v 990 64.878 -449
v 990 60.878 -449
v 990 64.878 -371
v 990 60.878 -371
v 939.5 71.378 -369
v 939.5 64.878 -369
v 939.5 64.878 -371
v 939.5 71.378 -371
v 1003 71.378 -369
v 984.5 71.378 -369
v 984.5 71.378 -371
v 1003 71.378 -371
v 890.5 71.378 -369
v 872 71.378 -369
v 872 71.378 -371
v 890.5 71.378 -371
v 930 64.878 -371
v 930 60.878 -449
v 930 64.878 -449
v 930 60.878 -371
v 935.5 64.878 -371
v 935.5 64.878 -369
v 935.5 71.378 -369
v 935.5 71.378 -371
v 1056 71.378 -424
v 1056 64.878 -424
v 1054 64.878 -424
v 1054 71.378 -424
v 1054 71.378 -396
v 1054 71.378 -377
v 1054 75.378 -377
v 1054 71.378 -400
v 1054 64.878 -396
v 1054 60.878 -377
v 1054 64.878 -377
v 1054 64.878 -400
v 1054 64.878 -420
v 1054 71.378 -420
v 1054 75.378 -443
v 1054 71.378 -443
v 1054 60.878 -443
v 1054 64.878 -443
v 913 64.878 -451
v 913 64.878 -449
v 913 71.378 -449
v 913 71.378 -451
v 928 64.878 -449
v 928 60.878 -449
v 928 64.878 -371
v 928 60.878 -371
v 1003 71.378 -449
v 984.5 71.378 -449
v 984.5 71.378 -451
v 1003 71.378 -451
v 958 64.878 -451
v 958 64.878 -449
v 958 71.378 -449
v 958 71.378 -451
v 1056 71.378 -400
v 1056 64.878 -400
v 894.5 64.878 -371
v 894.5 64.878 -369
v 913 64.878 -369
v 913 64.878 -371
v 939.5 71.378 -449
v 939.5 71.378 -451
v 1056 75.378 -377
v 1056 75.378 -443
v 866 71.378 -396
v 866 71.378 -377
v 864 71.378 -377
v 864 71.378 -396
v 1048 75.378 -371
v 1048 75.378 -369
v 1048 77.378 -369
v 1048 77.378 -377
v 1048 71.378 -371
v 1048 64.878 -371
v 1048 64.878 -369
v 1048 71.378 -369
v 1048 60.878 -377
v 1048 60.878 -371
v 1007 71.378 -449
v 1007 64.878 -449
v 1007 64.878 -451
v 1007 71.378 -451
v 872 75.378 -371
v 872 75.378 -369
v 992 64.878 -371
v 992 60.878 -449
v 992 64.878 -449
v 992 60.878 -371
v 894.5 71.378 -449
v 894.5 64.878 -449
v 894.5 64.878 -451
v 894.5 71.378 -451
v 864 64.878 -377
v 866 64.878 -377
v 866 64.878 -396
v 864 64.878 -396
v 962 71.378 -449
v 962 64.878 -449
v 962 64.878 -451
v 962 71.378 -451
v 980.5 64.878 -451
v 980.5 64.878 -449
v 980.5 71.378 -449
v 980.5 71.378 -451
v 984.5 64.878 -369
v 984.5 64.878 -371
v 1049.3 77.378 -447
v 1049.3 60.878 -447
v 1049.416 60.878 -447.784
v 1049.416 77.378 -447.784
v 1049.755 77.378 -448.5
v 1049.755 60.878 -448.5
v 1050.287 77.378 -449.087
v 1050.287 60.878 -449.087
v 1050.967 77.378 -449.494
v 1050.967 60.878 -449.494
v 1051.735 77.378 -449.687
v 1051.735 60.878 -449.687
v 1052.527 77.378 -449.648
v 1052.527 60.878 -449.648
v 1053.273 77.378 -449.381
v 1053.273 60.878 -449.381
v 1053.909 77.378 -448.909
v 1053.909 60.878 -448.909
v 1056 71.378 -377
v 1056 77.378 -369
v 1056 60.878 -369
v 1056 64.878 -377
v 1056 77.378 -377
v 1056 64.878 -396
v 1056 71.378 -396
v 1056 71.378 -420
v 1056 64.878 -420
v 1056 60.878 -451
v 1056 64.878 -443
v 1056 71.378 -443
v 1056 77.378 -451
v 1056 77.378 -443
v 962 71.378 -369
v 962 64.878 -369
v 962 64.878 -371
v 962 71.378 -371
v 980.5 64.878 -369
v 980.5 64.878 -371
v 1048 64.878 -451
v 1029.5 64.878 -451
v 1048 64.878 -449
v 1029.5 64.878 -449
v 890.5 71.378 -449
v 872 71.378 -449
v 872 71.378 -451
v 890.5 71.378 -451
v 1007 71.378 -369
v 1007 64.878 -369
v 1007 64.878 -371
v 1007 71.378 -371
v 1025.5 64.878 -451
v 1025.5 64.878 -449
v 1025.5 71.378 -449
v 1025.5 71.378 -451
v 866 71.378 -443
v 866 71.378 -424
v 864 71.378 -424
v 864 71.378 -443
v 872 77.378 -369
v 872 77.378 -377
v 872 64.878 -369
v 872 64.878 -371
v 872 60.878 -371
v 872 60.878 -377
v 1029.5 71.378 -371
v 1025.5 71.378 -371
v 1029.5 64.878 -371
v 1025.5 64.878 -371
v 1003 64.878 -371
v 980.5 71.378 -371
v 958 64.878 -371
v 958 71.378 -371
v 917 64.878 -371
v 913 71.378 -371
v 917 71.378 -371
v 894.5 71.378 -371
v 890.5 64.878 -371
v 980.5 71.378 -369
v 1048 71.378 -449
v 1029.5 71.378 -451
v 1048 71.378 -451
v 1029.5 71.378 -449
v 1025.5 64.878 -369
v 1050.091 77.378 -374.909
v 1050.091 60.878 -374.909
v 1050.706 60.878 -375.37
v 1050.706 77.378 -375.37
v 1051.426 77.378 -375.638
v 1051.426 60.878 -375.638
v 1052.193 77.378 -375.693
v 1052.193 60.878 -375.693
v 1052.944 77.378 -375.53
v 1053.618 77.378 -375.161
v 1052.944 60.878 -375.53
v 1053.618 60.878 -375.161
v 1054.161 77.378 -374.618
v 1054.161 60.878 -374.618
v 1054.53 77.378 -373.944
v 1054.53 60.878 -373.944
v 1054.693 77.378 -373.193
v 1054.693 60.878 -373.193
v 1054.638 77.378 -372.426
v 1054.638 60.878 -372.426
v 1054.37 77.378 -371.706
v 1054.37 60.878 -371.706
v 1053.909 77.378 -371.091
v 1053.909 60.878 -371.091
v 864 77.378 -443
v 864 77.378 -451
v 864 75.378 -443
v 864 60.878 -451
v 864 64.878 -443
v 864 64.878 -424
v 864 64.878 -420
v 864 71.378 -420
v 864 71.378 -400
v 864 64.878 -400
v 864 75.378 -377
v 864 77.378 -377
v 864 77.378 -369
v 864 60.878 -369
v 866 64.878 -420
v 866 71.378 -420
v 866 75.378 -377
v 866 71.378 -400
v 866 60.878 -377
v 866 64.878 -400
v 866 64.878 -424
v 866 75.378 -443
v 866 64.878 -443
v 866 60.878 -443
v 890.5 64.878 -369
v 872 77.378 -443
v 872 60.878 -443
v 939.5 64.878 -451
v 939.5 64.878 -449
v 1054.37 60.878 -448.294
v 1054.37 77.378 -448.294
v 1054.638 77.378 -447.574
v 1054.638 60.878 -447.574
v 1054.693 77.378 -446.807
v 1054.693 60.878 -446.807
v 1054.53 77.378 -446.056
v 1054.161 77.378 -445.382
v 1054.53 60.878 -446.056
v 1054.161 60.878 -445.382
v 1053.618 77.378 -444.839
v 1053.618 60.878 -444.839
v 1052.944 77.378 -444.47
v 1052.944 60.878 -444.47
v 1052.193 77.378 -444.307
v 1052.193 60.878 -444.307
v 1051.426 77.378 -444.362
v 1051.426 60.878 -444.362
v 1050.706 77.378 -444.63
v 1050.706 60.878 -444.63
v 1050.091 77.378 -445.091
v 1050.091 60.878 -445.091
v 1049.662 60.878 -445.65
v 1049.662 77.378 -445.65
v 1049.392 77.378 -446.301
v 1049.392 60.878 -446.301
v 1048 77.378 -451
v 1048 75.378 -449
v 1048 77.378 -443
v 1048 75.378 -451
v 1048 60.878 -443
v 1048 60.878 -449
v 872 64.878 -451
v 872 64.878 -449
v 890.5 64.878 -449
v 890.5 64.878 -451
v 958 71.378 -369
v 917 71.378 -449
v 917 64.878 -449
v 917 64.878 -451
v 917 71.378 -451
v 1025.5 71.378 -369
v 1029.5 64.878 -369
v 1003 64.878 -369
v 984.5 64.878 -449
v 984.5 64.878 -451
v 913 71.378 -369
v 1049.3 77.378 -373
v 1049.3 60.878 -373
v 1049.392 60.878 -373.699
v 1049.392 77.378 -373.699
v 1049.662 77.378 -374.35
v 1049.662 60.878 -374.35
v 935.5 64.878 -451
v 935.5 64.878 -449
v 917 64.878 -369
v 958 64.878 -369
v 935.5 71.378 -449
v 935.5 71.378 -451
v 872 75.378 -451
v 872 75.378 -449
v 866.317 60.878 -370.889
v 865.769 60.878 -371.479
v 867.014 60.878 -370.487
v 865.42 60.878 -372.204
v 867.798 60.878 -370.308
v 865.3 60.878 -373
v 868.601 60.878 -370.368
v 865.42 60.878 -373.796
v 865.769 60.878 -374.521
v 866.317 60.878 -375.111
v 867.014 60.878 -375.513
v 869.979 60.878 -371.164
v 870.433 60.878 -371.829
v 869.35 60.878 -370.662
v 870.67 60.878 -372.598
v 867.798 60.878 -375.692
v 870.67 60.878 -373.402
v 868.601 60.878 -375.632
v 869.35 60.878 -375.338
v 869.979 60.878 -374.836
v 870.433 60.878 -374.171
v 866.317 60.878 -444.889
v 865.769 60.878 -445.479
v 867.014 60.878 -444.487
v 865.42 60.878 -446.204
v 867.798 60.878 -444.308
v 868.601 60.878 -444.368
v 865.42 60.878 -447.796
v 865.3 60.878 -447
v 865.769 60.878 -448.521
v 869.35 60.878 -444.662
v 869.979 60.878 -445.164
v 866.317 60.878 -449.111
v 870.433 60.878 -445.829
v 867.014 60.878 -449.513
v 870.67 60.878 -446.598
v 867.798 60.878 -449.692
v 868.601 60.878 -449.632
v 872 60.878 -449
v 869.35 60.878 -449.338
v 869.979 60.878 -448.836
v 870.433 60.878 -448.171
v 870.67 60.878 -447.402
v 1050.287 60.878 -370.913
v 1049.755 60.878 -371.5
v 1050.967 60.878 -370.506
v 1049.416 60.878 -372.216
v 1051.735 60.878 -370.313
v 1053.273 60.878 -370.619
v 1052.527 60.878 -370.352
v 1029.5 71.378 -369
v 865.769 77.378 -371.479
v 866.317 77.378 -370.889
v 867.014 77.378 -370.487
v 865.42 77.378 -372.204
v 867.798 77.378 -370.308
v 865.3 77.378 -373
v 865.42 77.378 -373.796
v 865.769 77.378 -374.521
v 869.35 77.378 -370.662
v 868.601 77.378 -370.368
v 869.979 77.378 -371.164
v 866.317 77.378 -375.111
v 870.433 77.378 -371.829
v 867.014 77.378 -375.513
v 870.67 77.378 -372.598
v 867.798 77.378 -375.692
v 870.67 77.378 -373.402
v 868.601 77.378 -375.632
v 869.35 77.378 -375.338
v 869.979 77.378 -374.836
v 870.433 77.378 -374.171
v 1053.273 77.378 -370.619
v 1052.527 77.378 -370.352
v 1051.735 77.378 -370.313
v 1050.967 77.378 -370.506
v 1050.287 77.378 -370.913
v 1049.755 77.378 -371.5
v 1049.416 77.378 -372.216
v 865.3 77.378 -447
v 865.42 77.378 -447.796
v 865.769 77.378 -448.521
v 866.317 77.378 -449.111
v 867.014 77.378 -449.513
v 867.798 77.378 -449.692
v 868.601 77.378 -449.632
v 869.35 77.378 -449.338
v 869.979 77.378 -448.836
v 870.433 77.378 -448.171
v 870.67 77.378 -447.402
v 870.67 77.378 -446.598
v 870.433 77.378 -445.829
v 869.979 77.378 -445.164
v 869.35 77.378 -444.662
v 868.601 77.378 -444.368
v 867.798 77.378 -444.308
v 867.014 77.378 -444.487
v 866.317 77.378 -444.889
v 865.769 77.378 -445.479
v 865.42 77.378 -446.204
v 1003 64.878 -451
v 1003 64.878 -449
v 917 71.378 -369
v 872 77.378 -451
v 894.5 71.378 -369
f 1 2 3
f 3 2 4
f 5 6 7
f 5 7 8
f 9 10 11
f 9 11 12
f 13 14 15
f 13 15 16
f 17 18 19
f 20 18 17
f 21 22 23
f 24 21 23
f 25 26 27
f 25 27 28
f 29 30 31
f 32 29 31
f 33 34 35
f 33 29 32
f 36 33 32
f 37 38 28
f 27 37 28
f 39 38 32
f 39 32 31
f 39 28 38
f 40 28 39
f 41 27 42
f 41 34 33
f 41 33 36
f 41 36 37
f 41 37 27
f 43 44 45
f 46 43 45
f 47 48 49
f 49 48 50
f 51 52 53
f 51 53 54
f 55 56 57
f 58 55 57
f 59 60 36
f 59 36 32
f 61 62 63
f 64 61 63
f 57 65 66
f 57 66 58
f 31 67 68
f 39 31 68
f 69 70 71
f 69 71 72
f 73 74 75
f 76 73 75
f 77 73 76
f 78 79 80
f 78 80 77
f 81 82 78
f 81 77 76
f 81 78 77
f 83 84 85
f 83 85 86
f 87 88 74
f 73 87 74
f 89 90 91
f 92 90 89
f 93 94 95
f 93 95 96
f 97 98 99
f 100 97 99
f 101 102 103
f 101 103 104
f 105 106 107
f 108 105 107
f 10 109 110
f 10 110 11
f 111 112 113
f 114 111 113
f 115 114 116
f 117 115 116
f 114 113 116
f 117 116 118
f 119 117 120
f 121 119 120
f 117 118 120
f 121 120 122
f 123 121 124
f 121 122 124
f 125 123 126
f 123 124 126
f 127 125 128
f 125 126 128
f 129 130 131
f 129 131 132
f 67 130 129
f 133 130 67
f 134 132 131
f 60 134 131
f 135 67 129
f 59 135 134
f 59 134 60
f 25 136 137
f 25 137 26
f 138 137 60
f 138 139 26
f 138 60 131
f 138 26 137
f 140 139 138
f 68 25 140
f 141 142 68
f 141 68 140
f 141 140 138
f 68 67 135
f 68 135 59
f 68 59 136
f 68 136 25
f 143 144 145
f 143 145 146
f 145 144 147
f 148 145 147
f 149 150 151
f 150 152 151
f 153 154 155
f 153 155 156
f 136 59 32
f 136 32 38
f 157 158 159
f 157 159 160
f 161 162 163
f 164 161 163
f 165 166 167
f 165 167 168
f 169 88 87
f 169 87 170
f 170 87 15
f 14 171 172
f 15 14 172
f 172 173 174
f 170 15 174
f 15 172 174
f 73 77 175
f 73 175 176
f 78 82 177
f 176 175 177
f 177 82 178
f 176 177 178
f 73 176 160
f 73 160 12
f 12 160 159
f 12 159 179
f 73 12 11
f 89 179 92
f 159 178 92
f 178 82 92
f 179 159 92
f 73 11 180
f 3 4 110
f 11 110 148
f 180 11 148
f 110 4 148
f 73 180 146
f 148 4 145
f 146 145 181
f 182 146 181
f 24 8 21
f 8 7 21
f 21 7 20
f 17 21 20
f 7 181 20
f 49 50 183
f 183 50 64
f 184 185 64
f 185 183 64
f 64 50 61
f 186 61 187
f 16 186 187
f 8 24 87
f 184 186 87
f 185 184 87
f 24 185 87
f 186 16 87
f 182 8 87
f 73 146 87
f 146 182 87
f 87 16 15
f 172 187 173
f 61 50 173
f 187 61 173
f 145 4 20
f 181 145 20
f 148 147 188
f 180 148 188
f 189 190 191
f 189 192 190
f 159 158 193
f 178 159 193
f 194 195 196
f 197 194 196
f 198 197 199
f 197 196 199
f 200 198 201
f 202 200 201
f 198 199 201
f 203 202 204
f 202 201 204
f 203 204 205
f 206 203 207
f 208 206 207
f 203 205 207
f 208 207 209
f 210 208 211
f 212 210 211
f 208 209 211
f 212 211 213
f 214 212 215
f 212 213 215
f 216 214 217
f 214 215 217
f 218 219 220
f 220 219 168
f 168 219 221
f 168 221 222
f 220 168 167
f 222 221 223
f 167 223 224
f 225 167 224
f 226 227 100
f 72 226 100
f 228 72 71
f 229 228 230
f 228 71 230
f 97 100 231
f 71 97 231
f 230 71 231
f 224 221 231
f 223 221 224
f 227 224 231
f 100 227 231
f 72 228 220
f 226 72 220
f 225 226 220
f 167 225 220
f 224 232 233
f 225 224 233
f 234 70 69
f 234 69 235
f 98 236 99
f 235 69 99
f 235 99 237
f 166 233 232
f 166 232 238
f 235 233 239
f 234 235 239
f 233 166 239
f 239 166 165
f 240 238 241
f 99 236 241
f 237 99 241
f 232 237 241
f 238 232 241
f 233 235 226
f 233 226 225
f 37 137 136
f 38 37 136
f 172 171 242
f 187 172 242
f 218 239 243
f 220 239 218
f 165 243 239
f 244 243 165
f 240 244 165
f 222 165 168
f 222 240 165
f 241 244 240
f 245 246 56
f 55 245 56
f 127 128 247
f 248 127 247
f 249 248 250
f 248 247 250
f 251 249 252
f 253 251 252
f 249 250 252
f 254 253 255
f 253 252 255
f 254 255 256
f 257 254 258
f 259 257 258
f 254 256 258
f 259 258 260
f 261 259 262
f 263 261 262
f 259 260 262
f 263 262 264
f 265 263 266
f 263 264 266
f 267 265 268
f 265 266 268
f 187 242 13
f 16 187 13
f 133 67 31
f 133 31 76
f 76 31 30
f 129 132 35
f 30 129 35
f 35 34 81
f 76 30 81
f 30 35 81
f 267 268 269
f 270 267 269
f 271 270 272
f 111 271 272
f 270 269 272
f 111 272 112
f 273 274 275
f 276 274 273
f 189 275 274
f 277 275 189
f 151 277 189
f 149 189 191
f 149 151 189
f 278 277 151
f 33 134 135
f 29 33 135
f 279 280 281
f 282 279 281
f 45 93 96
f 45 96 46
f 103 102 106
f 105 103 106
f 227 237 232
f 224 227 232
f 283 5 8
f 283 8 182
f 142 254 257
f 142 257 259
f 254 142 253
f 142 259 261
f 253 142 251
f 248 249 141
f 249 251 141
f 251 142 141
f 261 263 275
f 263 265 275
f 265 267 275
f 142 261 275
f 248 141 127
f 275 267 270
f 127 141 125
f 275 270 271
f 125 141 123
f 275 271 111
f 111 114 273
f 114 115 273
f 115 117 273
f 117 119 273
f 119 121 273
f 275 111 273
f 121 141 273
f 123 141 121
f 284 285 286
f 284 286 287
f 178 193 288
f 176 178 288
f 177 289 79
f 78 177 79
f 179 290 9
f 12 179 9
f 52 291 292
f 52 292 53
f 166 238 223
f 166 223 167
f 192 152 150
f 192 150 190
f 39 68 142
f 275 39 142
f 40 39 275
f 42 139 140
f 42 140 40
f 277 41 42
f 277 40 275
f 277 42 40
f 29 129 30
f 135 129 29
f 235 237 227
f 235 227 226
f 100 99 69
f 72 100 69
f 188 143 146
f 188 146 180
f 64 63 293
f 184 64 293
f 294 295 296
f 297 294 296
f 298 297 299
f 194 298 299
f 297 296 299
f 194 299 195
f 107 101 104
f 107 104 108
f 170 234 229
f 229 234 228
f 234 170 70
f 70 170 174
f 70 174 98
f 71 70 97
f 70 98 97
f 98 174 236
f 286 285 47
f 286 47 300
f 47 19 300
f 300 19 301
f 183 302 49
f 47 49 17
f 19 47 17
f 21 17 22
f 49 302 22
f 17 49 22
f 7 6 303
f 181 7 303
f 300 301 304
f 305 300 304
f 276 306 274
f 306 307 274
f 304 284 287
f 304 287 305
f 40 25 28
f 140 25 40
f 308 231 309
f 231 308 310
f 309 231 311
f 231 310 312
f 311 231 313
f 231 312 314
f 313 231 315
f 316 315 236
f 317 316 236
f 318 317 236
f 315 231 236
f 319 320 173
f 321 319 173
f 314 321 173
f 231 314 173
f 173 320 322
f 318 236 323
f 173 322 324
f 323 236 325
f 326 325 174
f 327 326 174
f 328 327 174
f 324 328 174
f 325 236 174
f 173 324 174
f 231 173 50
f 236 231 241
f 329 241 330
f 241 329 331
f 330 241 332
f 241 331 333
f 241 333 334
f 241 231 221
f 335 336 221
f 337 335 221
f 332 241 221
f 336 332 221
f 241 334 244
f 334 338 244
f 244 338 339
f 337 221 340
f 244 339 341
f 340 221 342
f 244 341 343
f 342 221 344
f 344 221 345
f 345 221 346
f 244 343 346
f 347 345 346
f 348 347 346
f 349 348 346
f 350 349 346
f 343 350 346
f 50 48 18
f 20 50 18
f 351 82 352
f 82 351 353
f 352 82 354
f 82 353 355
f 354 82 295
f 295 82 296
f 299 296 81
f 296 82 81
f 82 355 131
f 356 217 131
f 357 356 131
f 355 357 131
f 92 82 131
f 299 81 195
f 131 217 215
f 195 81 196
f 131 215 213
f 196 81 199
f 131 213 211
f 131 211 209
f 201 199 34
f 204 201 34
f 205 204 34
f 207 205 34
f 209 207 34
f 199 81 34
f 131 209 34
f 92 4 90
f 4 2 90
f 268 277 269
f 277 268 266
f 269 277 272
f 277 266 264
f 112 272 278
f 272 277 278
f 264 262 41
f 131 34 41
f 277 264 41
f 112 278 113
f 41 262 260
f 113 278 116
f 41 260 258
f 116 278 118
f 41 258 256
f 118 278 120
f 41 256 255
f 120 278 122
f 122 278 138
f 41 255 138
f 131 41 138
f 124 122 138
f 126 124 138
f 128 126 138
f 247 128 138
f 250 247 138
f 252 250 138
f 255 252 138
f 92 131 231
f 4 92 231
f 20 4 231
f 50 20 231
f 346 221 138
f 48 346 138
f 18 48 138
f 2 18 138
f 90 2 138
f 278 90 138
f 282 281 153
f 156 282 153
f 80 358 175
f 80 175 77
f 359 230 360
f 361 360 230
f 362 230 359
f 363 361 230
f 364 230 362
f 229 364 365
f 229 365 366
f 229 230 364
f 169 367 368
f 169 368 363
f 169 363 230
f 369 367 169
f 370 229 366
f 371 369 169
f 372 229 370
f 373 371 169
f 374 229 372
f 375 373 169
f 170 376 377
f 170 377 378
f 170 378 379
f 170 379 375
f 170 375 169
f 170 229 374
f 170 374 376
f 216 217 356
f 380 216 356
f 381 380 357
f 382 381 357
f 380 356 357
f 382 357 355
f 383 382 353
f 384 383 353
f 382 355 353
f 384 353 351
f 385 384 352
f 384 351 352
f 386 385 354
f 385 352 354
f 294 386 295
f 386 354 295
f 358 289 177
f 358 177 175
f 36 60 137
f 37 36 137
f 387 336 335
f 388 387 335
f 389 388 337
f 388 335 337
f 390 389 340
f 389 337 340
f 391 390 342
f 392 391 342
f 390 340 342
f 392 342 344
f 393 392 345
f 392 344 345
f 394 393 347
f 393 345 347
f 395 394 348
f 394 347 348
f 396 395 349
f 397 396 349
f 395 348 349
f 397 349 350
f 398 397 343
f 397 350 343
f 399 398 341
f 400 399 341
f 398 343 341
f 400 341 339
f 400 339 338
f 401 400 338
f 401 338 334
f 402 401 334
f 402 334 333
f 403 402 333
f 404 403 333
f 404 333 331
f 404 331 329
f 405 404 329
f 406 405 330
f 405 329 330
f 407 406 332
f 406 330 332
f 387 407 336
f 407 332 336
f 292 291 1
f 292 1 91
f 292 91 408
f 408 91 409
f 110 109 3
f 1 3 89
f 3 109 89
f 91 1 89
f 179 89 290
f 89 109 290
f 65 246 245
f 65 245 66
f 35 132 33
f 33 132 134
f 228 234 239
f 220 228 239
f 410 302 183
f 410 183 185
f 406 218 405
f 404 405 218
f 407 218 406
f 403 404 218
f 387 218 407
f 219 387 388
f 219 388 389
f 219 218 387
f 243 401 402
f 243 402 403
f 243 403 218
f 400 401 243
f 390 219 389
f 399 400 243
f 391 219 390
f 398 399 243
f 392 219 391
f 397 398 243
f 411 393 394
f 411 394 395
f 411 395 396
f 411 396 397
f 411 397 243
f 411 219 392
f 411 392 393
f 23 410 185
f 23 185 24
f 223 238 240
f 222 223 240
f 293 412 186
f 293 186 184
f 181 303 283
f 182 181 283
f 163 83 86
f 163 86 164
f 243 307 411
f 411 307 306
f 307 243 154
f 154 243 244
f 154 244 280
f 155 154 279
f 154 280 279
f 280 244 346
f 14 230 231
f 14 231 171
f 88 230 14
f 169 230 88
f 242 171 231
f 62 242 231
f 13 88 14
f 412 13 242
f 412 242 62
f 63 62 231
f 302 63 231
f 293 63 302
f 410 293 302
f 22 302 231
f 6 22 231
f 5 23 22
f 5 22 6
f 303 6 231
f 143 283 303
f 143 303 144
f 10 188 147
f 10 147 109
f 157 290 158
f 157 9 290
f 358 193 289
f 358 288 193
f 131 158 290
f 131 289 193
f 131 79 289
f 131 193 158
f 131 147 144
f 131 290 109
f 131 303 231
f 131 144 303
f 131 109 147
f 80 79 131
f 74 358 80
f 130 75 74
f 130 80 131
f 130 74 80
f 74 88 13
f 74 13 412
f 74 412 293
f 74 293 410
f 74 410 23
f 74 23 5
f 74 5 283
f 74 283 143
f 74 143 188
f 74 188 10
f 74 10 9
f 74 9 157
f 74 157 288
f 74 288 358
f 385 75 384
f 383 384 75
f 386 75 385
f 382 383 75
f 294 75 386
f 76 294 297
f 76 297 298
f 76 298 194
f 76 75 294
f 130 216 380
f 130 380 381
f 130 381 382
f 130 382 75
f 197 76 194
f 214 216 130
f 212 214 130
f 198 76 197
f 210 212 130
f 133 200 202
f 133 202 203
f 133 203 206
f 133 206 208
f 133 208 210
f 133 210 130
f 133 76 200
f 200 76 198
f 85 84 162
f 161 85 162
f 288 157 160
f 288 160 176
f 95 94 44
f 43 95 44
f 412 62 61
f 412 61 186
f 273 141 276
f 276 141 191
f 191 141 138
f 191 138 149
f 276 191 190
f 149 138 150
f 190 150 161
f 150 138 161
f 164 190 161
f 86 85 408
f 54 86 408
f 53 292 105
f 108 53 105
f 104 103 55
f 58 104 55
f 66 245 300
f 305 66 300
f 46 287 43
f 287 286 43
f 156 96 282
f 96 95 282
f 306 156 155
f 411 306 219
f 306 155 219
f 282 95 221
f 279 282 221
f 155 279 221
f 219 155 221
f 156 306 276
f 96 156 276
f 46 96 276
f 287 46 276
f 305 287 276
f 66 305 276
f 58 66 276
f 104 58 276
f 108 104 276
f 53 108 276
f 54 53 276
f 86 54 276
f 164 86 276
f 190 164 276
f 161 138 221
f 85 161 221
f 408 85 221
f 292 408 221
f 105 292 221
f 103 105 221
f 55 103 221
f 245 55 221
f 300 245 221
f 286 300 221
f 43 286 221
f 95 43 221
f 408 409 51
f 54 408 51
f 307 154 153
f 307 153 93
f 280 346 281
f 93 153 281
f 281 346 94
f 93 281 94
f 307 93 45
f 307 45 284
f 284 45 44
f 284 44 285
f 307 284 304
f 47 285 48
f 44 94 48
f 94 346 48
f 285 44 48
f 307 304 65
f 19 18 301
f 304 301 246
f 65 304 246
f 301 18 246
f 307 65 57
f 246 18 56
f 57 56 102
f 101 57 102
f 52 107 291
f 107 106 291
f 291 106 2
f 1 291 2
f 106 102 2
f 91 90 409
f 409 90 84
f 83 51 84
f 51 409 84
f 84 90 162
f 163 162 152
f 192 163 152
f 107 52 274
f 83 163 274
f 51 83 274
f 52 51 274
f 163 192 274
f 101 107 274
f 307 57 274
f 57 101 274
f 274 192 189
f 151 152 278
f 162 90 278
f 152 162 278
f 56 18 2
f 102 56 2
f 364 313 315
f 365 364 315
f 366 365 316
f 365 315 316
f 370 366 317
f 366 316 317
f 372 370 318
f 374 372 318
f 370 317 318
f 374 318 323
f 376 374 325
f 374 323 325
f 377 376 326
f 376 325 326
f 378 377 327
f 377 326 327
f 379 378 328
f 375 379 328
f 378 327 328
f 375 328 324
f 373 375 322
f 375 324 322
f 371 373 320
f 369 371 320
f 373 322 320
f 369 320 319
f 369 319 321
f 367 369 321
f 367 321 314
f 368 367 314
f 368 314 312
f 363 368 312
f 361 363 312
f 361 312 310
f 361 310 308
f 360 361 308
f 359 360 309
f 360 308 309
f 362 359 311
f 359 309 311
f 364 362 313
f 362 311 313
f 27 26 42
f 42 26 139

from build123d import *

# Parameters (mm, degrees)
SKETCH1_W               = 900
SKETCH1_H               = 20
SKETCH1_W_2             = 20
SKETCH1_H_2             = 350
SKETCH1_H_3             = 700
BOSS_EXTRUDE1_DEPTH     = 165
SKETCH2_W               = 205
SKETCH2_H               = 65
SKETCH2_W_2             = 185
SKETCH2_W_3             = 1800
SKETCH2_H_2             = 20
CUT_EXTRUDE1_DEPTH      = 1
CUT_EXTRUDE1_DEPTH_BACK = 821
SKETCH3_W               = 200
SKETCH3_H               = 65
SKETCH3_W_2             = 210
CUT_EXTRUDE2_DEPTH      = 1
CUT_EXTRUDE2_DEPTH_BACK = 1921
SKETCH5_W               = 20
SKETCH5_H               = 780
BOSS_EXTRUDE3_DEPTH     = 40
SCALE2_SCALE            = 0.1
SKETCH6_W               = 7
SKETCH6_H               = 7
BOSS_EXTRUDE4_DEPTH     = 16.5
SKETCH7_R               = 2.75
CUT_EXTRUDE3_DEPTH      = 1
CUT_EXTRUDE3_DEPTH_BACK = 17.5
SKETCH8_W               = 8
SKETCH8_H               = 8
BOSS_EXTRUDE5_DEPTH     = 16.5
SKETCH9_R               = 2.7
CUT_EXTRUDE4_DEPTH      = 16.5


with BuildPart() as part:
    # Sketch1 → Boss-Extrude1 (new body)
    with BuildSketch(Plane(origin=(0, 0, 0), x_dir=(1, 0, 0), z_dir=(0, 1, 0))):
        Polygon((5, 815), (0, 815), (0, 765), (5, 765), (5, 790), align=None)
        with BuildLine():
            Line((5, 790), (5, 765))
            Line((5, 765), (12.32233047, 772.32233047))
            ThreePointArc((12.32233047, 772.32233047), (6.903011687, 780.432914191), (5, 790))
        make_face()
        with BuildLine():
            Line((12.32233047, 772.32233047), (5, 765))
            Line((5, 765), (30, 765))
            ThreePointArc((30, 765), (20.432914191, 766.903011687), (12.32233047, 772.32233047))
        make_face()
        Polygon((5, 765), (0, 765), (0, 760), align=None)
        Polygon((5, 765), (0, 760), (20, 760), (60, 760), (60, 765), (55, 765), (30, 765), align=None)
        with BuildLine():
            Line((55, 765), (55, 790))
            ThreePointArc((55, 790), (47.67766953, 772.32233047), (30, 765))
            Line((30, 765), (55, 765))
        make_face()
        Polygon((60, 800), (60, 820), (55, 815), (55, 790), (55, 765), (60, 765), align=None)
        with BuildLine():
            Line((30, 815), (5, 815))
            Line((5, 815), (5, 790))
            ThreePointArc((5, 790), (12.32233047, 807.67766953), (30, 815))
        make_face()
        Polygon((55, 820), (0, 820), (0, 815), (5, 815), (30, 815), (55, 815), align=None)
        with BuildLine():
            Line((47.67766953, 807.67766953), (55, 815))
            Line((55, 815), (30, 815))
            ThreePointArc((30, 815), (39.567085809, 813.096988313), (47.67766953, 807.67766953))
        make_face()
        with BuildLine():
            Line((55, 790), (55, 815))
            Line((55, 815), (47.67766953, 807.67766953))
            ThreePointArc((47.67766953, 807.67766953), (53.096988313, 799.567085809), (55, 790))
        make_face()
        Polygon((60, 820), (55, 820), (55, 815), align=None)
        with Locations((510, 810)):
            Rectangle(SKETCH1_W, SKETCH1_H)
        with Locations((10, 585)):
            Rectangle(SKETCH1_W_2, SKETCH1_H_2)
        with Locations((10, 235)):
            Rectangle(SKETCH1_W_2, SKETCH1_H_2)
        Polygon((5, 55), (0, 60), (0, 55), align=None)
        Polygon((5, 55), (0, 55), (0, 5), (5, 5), (5, 30), align=None)
        Polygon((20, 60), (0, 60), (5, 55), (30, 55), (55, 55), (60, 55), (60, 60), align=None)
        with BuildLine():
            Line((30, 55), (5, 55))
            Line((5, 55), (12.32233047, 47.67766953))
            ThreePointArc((12.32233047, 47.67766953), (20.432914191, 53.096988313), (30, 55))
        make_face()
        with BuildLine():
            Line((12.32233047, 47.67766953), (5, 55))
            Line((5, 55), (5, 30))
            ThreePointArc((5, 30), (6.903011687, 39.567085809), (12.32233047, 47.67766953))
        make_face()
        with BuildLine():
            Line((55, 55), (30, 55))
            ThreePointArc((30, 55), (47.67766953, 47.67766953), (55, 30))
            Line((55, 30), (55, 55))
        make_face()
        Polygon((60, 0), (60, 20), (60, 55), (55, 55), (55, 30), (55, 5), align=None)
        with BuildLine():
            Line((55, 5), (47.67766953, 12.32233047))
            ThreePointArc((47.67766953, 12.32233047), (39.567085809, 6.903011687), (30, 5))
            Line((30, 5), (55, 5))
        make_face()
        with BuildLine():
            ThreePointArc((55, 30), (53.096988313, 20.432914191), (47.67766953, 12.32233047))
            Line((47.67766953, 12.32233047), (55, 5))
            Line((55, 5), (55, 30))
        make_face()
        Polygon((5, 5), (0, 5), (0, 0), (55, 0), (55, 5), (30, 5), align=None)
        Polygon((55, 0), (60, 0), (55, 5), align=None)
        with BuildLine():
            ThreePointArc((30, 5), (12.32233047, 12.32233047), (5, 30))
            Line((5, 30), (5, 5))
            Line((5, 5), (30, 5))
        make_face()
        with Locations((510, 10)):
            Rectangle(SKETCH1_W, SKETCH1_H)
        with Locations((1410, 10)):
            Rectangle(SKETCH1_W, SKETCH1_H)
        Polygon((1860, 55), (1860, 20), (1860, 0), (1865, 5), (1865, 30), (1865, 55), align=None)
        with BuildLine():
            Line((1865, 30), (1865, 5))
            Line((1865, 5), (1872.32233047, 12.32233047))
            ThreePointArc((1872.32233047, 12.32233047), (1866.903011687, 20.432914191), (1865, 30))
        make_face()
        with BuildLine():
            Line((1872.32233047, 12.32233047), (1865, 5))
            Line((1865, 5), (1890, 5))
            ThreePointArc((1890, 5), (1880.432914191, 6.903011687), (1872.32233047, 12.32233047))
        make_face()
        Polygon((1865, 5), (1860, 0), (1865, 0), align=None)
        Polygon((1865, 5), (1865, 0), (1920, 0), (1920, 5), (1915, 5), (1890, 5), align=None)
        with BuildLine():
            ThreePointArc((1915, 30), (1907.67766953, 12.32233047), (1890, 5))
            Line((1890, 5), (1915, 5))
            Line((1915, 5), (1915, 30))
        make_face()
        Polygon((1920, 5), (1920, 55), (1915, 55), (1915, 30), (1915, 5), align=None)
        Polygon((1860, 60), (1860, 55), (1865, 55), (1890, 55), (1915, 55), (1920, 60), (1900, 60), align=None)
        with BuildLine():
            Line((1890, 55), (1865, 55))
            Line((1865, 55), (1865, 30))
            ThreePointArc((1865, 30), (1872.32233047, 47.67766953), (1890, 55))
        make_face()
        with BuildLine():
            Line((1915, 55), (1890, 55))
            ThreePointArc((1890, 55), (1899.567085809, 53.096988313), (1907.67766953, 47.67766953))
            Line((1907.67766953, 47.67766953), (1915, 55))
        make_face()
        Polygon((1920, 55), (1920, 60), (1915, 55), align=None)
        with BuildLine():
            Line((1915, 30), (1915, 55))
            Line((1915, 55), (1907.67766953, 47.67766953))
            ThreePointArc((1907.67766953, 47.67766953), (1913.096988313, 39.567085809), (1915, 30))
        make_face()
        with Locations((1910, 410)):
            Rectangle(SKETCH1_W_2, SKETCH1_H_3)
        Polygon((1865, 765), (1860, 765), (1860, 760), (1900, 760), (1920, 760), (1915, 765), (1890, 765), align=None)
        Polygon((1920, 760), (1920, 765), (1915, 765), align=None)
        with BuildLine():
            ThreePointArc((1915, 790), (1913.096988313, 780.432914191), (1907.67766953, 772.32233047))
            Line((1907.67766953, 772.32233047), (1915, 765))
            Line((1915, 765), (1915, 790))
        make_face()
        with BuildLine():
            Line((1915, 765), (1907.67766953, 772.32233047))
            ThreePointArc((1907.67766953, 772.32233047), (1899.567085809, 766.903011687), (1890, 765))
            Line((1890, 765), (1915, 765))
        make_face()
        Polygon((1920, 765), (1920, 815), (1915, 815), (1915, 790), (1915, 765), align=None)
        Polygon((1920, 820), (1865, 820), (1865, 815), (1890, 815), (1915, 815), (1920, 815), align=None)
        with BuildLine():
            Line((1915, 815), (1890, 815))
            ThreePointArc((1890, 815), (1907.67766953, 807.67766953), (1915, 790))
            Line((1915, 790), (1915, 815))
        make_face()
        Polygon((1865, 820), (1860, 820), (1865, 815), align=None)
        Polygon((1865, 815), (1860, 820), (1860, 800), (1860, 765), (1865, 765), (1865, 790), align=None)
        with BuildLine():
            Line((1872.32233047, 807.67766953), (1865, 815))
            Line((1865, 815), (1865, 790))
            ThreePointArc((1865, 790), (1866.903011687, 799.567085809), (1872.32233047, 807.67766953))
        make_face()
        with BuildLine():
            Line((1890, 815), (1865, 815))
            Line((1865, 815), (1872.32233047, 807.67766953))
            ThreePointArc((1872.32233047, 807.67766953), (1880.432914191, 813.096988313), (1890, 815))
        make_face()
        with BuildLine():
            ThreePointArc((1890, 765), (1872.32233047, 772.32233047), (1865, 790))
            Line((1865, 790), (1865, 765))
            Line((1865, 765), (1890, 765))
        make_face()
        with Locations((1410, 810)):
            Rectangle(SKETCH1_W, SKETCH1_H)
    extrude(amount=BOSS_EXTRUDE1_DEPTH)

    # Sketch2 → Cut-Extrude1 (cut, two sides)
    with BuildSketch(Plane.XY) as cut_extrude1_sk:
        with Locations((162.5, 72.5)):
            Rectangle(SKETCH2_W, SKETCH2_H)
        with Locations((397.5, 72.5)):
            Rectangle(SKETCH2_W_2, SKETCH2_H)
        with Locations((622.5, 72.5)):
            Rectangle(SKETCH2_W_2, SKETCH2_H)
        with Locations((847.5, 72.5)):
            Rectangle(SKETCH2_W_2, SKETCH2_H)
        with Locations((1072.5, 72.5)):
            Rectangle(SKETCH2_W_2, SKETCH2_H)
        with Locations((1297.5, 72.5)):
            Rectangle(SKETCH2_W_2, SKETCH2_H)
        with Locations((1522.5, 72.5)):
            Rectangle(SKETCH2_W_2, SKETCH2_H)
        with Locations((1757.5, 72.5)):
            Rectangle(SKETCH2_W, SKETCH2_H)
        with Locations((960, 155)):
            Rectangle(SKETCH2_W_3, SKETCH2_H_2)
    extrude(amount=CUT_EXTRUDE1_DEPTH, mode=Mode.SUBTRACT)
    extrude(cut_extrude1_sk.sketch, amount=-CUT_EXTRUDE1_DEPTH_BACK, mode=Mode.SUBTRACT)

    # Sketch3 → Cut-Extrude2 (cut, two sides)
    with BuildSketch(Plane(origin=(1920, 0, 0), x_dir=(0, 0, -1), z_dir=(1, 0, 0))) as cut_extrude2_sk:
        Polygon((410, 145), (410, 165), (60, 165), (60, 145), (270, 145), (310, 145), align=None)
        Polygon((760, 145), (760, 165), (410, 165), (410, 145), (510, 145), (550, 145), align=None)
        with Locations((410, 72.5)):
            Rectangle(SKETCH3_W, SKETCH3_H)
        with Locations((655, 72.5)):
            Rectangle(SKETCH3_W_2, SKETCH3_H)
        with Locations((165, 72.5)):
            Rectangle(SKETCH3_W_2, SKETCH3_H)
    extrude(amount=CUT_EXTRUDE2_DEPTH, mode=Mode.SUBTRACT)
    extrude(cut_extrude2_sk.sketch, amount=-CUT_EXTRUDE2_DEPTH_BACK, mode=Mode.SUBTRACT)

    # Sketch5 → Boss-Extrude3 (add)
    with BuildSketch(Plane.XZ):
        with Locations((650, -410)):
            Rectangle(SKETCH5_W, SKETCH5_H)
        with Locations((1270, -410)):
            Rectangle(SKETCH5_W, SKETCH5_H)
    extrude(amount=-BOSS_EXTRUDE3_DEPTH)


with BuildPart() as part_1:
    # Scale2: scaled about (960, 67.642168167, -410)
    add(part.part.scale(SCALE2_SCALE).moved(Location((864, 60.87795135, -369))))

    # Sketch6 → Boss-Extrude4 (add)
    with BuildSketch(Plane(origin=(0, 77.37795135, 0), x_dir=(1, 0, 0), z_dir=(0, 1, 0))):
        with Locations((1052.5, 372.5)):
            Rectangle(SKETCH6_W, SKETCH6_H)
        with Locations((867.5, 372.5)):
            Rectangle(SKETCH6_W, SKETCH6_H)
        with Locations((1052.5, 447.5)):
            Rectangle(SKETCH6_W, SKETCH6_H)
        with Locations((867.5, 447.5)):
            Rectangle(SKETCH6_W, SKETCH6_H)
    extrude(amount=-BOSS_EXTRUDE4_DEPTH)

    # Sketch7 → Cut-Extrude3 (cut, two sides)
    with BuildSketch(Plane(origin=(0, 77.37795135, 0), x_dir=(1, 0, 0), z_dir=(0, 1, 0))) as cut_extrude3_sk:
        with BuildLine():
            ThreePointArc((1052.5, 375.25), (1049.75, 372.5), (1052.5, 369.75))
            Line((1052.5, 369.75), (1052.5, 375.25))
        make_face()
        with BuildLine():
            Line((1052.5, 375.25), (1052.5, 369.75))
            ThreePointArc((1052.5, 369.75), (1054.444543648, 370.555456352), (1055.25, 372.5))
            ThreePointArc((1055.25, 372.5), (1054.444543648, 374.444543648), (1052.5, 375.25))
        make_face()
        with BuildLine():
            ThreePointArc((1055.25, 447.5), (1054.444543648, 449.444543648), (1052.5, 450.25))
            Line((1052.5, 450.25), (1052.5, 444.75))
            ThreePointArc((1052.5, 444.75), (1054.444543648, 445.555456352), (1055.25, 447.5))
        make_face()
        with BuildLine():
            Line((1052.5, 444.75), (1052.5, 450.25))
            ThreePointArc((1052.5, 450.25), (1049.75, 447.5), (1052.5, 444.75))
        make_face()
        with Locations((867.5, 447.5)):
            Circle(SKETCH7_R)
        with Locations((867.5, 372.5)):
            Circle(SKETCH7_R)
    extrude(amount=CUT_EXTRUDE3_DEPTH, mode=Mode.SUBTRACT)
    extrude(cut_extrude3_sk.sketch, amount=-CUT_EXTRUDE3_DEPTH_BACK, mode=Mode.SUBTRACT)

    # Sketch8 → Boss-Extrude5 (add)
    with BuildSketch(Plane(origin=(0, 60.87795135, 0), x_dir=(-1, 0, 0), z_dir=(0, -1, 0))):
        with Locations((-868, 373)):
            Rectangle(SKETCH8_W, SKETCH8_H)
        with Locations((-1052, 447)):
            Rectangle(SKETCH8_W, SKETCH8_H)
        with Locations((-1052, 373)):
            Rectangle(SKETCH8_W, SKETCH8_H)
        with Locations((-868, 447)):
            Rectangle(SKETCH8_W, SKETCH8_H)
    extrude(amount=-BOSS_EXTRUDE5_DEPTH)

    # Sketch9 → Cut-Extrude4 (cut)
    with BuildSketch(Plane(origin=(0, 60.87795135, 0), x_dir=(-1, 0, 0), z_dir=(0, -1, 0))):
        with BuildLine():
            ThreePointArc((-1053.909188309, 448.909188309), (-1053.909188309, 445.090811691), (-1050.090811691, 445.090811691))
            Line((-1050.090811691, 445.090811691), (-1053.909188309, 448.909188309))
        make_face()
        with BuildLine():
            Line((-1053.909188309, 448.909188309), (-1050.090811691, 445.090811691))
            ThreePointArc((-1050.090811691, 445.090811691), (-1049.505525262, 445.966754733), (-1049.3, 447))
            ThreePointArc((-1049.3, 447), (-1050.966754733, 449.494474738), (-1053.909188309, 448.909188309))
        make_face()
        with BuildLine():
            ThreePointArc((-1050.090811691, 374.909188309), (-1053.909188309, 374.909188309), (-1053.909188309, 371.090811691))
            Line((-1053.909188309, 371.090811691), (-1050.090811691, 374.909188309))
        make_face()
        with BuildLine():
            Line((-1050.090811691, 374.909188309), (-1053.909188309, 371.090811691))
            ThreePointArc((-1053.909188309, 371.090811691), (-1050.966754733, 370.505525262), (-1049.3, 373))
            ThreePointArc((-1049.3, 373), (-1049.505525262, 374.033245267), (-1050.090811691, 374.909188309))
        make_face()
        with Locations((-868, 447)):
            Circle(SKETCH9_R)
        with Locations((-868, 373)):
            Circle(SKETCH9_R)
    extrude(amount=-CUT_EXTRUDE4_DEPTH, mode=Mode.SUBTRACT)


solid = part_1.part
